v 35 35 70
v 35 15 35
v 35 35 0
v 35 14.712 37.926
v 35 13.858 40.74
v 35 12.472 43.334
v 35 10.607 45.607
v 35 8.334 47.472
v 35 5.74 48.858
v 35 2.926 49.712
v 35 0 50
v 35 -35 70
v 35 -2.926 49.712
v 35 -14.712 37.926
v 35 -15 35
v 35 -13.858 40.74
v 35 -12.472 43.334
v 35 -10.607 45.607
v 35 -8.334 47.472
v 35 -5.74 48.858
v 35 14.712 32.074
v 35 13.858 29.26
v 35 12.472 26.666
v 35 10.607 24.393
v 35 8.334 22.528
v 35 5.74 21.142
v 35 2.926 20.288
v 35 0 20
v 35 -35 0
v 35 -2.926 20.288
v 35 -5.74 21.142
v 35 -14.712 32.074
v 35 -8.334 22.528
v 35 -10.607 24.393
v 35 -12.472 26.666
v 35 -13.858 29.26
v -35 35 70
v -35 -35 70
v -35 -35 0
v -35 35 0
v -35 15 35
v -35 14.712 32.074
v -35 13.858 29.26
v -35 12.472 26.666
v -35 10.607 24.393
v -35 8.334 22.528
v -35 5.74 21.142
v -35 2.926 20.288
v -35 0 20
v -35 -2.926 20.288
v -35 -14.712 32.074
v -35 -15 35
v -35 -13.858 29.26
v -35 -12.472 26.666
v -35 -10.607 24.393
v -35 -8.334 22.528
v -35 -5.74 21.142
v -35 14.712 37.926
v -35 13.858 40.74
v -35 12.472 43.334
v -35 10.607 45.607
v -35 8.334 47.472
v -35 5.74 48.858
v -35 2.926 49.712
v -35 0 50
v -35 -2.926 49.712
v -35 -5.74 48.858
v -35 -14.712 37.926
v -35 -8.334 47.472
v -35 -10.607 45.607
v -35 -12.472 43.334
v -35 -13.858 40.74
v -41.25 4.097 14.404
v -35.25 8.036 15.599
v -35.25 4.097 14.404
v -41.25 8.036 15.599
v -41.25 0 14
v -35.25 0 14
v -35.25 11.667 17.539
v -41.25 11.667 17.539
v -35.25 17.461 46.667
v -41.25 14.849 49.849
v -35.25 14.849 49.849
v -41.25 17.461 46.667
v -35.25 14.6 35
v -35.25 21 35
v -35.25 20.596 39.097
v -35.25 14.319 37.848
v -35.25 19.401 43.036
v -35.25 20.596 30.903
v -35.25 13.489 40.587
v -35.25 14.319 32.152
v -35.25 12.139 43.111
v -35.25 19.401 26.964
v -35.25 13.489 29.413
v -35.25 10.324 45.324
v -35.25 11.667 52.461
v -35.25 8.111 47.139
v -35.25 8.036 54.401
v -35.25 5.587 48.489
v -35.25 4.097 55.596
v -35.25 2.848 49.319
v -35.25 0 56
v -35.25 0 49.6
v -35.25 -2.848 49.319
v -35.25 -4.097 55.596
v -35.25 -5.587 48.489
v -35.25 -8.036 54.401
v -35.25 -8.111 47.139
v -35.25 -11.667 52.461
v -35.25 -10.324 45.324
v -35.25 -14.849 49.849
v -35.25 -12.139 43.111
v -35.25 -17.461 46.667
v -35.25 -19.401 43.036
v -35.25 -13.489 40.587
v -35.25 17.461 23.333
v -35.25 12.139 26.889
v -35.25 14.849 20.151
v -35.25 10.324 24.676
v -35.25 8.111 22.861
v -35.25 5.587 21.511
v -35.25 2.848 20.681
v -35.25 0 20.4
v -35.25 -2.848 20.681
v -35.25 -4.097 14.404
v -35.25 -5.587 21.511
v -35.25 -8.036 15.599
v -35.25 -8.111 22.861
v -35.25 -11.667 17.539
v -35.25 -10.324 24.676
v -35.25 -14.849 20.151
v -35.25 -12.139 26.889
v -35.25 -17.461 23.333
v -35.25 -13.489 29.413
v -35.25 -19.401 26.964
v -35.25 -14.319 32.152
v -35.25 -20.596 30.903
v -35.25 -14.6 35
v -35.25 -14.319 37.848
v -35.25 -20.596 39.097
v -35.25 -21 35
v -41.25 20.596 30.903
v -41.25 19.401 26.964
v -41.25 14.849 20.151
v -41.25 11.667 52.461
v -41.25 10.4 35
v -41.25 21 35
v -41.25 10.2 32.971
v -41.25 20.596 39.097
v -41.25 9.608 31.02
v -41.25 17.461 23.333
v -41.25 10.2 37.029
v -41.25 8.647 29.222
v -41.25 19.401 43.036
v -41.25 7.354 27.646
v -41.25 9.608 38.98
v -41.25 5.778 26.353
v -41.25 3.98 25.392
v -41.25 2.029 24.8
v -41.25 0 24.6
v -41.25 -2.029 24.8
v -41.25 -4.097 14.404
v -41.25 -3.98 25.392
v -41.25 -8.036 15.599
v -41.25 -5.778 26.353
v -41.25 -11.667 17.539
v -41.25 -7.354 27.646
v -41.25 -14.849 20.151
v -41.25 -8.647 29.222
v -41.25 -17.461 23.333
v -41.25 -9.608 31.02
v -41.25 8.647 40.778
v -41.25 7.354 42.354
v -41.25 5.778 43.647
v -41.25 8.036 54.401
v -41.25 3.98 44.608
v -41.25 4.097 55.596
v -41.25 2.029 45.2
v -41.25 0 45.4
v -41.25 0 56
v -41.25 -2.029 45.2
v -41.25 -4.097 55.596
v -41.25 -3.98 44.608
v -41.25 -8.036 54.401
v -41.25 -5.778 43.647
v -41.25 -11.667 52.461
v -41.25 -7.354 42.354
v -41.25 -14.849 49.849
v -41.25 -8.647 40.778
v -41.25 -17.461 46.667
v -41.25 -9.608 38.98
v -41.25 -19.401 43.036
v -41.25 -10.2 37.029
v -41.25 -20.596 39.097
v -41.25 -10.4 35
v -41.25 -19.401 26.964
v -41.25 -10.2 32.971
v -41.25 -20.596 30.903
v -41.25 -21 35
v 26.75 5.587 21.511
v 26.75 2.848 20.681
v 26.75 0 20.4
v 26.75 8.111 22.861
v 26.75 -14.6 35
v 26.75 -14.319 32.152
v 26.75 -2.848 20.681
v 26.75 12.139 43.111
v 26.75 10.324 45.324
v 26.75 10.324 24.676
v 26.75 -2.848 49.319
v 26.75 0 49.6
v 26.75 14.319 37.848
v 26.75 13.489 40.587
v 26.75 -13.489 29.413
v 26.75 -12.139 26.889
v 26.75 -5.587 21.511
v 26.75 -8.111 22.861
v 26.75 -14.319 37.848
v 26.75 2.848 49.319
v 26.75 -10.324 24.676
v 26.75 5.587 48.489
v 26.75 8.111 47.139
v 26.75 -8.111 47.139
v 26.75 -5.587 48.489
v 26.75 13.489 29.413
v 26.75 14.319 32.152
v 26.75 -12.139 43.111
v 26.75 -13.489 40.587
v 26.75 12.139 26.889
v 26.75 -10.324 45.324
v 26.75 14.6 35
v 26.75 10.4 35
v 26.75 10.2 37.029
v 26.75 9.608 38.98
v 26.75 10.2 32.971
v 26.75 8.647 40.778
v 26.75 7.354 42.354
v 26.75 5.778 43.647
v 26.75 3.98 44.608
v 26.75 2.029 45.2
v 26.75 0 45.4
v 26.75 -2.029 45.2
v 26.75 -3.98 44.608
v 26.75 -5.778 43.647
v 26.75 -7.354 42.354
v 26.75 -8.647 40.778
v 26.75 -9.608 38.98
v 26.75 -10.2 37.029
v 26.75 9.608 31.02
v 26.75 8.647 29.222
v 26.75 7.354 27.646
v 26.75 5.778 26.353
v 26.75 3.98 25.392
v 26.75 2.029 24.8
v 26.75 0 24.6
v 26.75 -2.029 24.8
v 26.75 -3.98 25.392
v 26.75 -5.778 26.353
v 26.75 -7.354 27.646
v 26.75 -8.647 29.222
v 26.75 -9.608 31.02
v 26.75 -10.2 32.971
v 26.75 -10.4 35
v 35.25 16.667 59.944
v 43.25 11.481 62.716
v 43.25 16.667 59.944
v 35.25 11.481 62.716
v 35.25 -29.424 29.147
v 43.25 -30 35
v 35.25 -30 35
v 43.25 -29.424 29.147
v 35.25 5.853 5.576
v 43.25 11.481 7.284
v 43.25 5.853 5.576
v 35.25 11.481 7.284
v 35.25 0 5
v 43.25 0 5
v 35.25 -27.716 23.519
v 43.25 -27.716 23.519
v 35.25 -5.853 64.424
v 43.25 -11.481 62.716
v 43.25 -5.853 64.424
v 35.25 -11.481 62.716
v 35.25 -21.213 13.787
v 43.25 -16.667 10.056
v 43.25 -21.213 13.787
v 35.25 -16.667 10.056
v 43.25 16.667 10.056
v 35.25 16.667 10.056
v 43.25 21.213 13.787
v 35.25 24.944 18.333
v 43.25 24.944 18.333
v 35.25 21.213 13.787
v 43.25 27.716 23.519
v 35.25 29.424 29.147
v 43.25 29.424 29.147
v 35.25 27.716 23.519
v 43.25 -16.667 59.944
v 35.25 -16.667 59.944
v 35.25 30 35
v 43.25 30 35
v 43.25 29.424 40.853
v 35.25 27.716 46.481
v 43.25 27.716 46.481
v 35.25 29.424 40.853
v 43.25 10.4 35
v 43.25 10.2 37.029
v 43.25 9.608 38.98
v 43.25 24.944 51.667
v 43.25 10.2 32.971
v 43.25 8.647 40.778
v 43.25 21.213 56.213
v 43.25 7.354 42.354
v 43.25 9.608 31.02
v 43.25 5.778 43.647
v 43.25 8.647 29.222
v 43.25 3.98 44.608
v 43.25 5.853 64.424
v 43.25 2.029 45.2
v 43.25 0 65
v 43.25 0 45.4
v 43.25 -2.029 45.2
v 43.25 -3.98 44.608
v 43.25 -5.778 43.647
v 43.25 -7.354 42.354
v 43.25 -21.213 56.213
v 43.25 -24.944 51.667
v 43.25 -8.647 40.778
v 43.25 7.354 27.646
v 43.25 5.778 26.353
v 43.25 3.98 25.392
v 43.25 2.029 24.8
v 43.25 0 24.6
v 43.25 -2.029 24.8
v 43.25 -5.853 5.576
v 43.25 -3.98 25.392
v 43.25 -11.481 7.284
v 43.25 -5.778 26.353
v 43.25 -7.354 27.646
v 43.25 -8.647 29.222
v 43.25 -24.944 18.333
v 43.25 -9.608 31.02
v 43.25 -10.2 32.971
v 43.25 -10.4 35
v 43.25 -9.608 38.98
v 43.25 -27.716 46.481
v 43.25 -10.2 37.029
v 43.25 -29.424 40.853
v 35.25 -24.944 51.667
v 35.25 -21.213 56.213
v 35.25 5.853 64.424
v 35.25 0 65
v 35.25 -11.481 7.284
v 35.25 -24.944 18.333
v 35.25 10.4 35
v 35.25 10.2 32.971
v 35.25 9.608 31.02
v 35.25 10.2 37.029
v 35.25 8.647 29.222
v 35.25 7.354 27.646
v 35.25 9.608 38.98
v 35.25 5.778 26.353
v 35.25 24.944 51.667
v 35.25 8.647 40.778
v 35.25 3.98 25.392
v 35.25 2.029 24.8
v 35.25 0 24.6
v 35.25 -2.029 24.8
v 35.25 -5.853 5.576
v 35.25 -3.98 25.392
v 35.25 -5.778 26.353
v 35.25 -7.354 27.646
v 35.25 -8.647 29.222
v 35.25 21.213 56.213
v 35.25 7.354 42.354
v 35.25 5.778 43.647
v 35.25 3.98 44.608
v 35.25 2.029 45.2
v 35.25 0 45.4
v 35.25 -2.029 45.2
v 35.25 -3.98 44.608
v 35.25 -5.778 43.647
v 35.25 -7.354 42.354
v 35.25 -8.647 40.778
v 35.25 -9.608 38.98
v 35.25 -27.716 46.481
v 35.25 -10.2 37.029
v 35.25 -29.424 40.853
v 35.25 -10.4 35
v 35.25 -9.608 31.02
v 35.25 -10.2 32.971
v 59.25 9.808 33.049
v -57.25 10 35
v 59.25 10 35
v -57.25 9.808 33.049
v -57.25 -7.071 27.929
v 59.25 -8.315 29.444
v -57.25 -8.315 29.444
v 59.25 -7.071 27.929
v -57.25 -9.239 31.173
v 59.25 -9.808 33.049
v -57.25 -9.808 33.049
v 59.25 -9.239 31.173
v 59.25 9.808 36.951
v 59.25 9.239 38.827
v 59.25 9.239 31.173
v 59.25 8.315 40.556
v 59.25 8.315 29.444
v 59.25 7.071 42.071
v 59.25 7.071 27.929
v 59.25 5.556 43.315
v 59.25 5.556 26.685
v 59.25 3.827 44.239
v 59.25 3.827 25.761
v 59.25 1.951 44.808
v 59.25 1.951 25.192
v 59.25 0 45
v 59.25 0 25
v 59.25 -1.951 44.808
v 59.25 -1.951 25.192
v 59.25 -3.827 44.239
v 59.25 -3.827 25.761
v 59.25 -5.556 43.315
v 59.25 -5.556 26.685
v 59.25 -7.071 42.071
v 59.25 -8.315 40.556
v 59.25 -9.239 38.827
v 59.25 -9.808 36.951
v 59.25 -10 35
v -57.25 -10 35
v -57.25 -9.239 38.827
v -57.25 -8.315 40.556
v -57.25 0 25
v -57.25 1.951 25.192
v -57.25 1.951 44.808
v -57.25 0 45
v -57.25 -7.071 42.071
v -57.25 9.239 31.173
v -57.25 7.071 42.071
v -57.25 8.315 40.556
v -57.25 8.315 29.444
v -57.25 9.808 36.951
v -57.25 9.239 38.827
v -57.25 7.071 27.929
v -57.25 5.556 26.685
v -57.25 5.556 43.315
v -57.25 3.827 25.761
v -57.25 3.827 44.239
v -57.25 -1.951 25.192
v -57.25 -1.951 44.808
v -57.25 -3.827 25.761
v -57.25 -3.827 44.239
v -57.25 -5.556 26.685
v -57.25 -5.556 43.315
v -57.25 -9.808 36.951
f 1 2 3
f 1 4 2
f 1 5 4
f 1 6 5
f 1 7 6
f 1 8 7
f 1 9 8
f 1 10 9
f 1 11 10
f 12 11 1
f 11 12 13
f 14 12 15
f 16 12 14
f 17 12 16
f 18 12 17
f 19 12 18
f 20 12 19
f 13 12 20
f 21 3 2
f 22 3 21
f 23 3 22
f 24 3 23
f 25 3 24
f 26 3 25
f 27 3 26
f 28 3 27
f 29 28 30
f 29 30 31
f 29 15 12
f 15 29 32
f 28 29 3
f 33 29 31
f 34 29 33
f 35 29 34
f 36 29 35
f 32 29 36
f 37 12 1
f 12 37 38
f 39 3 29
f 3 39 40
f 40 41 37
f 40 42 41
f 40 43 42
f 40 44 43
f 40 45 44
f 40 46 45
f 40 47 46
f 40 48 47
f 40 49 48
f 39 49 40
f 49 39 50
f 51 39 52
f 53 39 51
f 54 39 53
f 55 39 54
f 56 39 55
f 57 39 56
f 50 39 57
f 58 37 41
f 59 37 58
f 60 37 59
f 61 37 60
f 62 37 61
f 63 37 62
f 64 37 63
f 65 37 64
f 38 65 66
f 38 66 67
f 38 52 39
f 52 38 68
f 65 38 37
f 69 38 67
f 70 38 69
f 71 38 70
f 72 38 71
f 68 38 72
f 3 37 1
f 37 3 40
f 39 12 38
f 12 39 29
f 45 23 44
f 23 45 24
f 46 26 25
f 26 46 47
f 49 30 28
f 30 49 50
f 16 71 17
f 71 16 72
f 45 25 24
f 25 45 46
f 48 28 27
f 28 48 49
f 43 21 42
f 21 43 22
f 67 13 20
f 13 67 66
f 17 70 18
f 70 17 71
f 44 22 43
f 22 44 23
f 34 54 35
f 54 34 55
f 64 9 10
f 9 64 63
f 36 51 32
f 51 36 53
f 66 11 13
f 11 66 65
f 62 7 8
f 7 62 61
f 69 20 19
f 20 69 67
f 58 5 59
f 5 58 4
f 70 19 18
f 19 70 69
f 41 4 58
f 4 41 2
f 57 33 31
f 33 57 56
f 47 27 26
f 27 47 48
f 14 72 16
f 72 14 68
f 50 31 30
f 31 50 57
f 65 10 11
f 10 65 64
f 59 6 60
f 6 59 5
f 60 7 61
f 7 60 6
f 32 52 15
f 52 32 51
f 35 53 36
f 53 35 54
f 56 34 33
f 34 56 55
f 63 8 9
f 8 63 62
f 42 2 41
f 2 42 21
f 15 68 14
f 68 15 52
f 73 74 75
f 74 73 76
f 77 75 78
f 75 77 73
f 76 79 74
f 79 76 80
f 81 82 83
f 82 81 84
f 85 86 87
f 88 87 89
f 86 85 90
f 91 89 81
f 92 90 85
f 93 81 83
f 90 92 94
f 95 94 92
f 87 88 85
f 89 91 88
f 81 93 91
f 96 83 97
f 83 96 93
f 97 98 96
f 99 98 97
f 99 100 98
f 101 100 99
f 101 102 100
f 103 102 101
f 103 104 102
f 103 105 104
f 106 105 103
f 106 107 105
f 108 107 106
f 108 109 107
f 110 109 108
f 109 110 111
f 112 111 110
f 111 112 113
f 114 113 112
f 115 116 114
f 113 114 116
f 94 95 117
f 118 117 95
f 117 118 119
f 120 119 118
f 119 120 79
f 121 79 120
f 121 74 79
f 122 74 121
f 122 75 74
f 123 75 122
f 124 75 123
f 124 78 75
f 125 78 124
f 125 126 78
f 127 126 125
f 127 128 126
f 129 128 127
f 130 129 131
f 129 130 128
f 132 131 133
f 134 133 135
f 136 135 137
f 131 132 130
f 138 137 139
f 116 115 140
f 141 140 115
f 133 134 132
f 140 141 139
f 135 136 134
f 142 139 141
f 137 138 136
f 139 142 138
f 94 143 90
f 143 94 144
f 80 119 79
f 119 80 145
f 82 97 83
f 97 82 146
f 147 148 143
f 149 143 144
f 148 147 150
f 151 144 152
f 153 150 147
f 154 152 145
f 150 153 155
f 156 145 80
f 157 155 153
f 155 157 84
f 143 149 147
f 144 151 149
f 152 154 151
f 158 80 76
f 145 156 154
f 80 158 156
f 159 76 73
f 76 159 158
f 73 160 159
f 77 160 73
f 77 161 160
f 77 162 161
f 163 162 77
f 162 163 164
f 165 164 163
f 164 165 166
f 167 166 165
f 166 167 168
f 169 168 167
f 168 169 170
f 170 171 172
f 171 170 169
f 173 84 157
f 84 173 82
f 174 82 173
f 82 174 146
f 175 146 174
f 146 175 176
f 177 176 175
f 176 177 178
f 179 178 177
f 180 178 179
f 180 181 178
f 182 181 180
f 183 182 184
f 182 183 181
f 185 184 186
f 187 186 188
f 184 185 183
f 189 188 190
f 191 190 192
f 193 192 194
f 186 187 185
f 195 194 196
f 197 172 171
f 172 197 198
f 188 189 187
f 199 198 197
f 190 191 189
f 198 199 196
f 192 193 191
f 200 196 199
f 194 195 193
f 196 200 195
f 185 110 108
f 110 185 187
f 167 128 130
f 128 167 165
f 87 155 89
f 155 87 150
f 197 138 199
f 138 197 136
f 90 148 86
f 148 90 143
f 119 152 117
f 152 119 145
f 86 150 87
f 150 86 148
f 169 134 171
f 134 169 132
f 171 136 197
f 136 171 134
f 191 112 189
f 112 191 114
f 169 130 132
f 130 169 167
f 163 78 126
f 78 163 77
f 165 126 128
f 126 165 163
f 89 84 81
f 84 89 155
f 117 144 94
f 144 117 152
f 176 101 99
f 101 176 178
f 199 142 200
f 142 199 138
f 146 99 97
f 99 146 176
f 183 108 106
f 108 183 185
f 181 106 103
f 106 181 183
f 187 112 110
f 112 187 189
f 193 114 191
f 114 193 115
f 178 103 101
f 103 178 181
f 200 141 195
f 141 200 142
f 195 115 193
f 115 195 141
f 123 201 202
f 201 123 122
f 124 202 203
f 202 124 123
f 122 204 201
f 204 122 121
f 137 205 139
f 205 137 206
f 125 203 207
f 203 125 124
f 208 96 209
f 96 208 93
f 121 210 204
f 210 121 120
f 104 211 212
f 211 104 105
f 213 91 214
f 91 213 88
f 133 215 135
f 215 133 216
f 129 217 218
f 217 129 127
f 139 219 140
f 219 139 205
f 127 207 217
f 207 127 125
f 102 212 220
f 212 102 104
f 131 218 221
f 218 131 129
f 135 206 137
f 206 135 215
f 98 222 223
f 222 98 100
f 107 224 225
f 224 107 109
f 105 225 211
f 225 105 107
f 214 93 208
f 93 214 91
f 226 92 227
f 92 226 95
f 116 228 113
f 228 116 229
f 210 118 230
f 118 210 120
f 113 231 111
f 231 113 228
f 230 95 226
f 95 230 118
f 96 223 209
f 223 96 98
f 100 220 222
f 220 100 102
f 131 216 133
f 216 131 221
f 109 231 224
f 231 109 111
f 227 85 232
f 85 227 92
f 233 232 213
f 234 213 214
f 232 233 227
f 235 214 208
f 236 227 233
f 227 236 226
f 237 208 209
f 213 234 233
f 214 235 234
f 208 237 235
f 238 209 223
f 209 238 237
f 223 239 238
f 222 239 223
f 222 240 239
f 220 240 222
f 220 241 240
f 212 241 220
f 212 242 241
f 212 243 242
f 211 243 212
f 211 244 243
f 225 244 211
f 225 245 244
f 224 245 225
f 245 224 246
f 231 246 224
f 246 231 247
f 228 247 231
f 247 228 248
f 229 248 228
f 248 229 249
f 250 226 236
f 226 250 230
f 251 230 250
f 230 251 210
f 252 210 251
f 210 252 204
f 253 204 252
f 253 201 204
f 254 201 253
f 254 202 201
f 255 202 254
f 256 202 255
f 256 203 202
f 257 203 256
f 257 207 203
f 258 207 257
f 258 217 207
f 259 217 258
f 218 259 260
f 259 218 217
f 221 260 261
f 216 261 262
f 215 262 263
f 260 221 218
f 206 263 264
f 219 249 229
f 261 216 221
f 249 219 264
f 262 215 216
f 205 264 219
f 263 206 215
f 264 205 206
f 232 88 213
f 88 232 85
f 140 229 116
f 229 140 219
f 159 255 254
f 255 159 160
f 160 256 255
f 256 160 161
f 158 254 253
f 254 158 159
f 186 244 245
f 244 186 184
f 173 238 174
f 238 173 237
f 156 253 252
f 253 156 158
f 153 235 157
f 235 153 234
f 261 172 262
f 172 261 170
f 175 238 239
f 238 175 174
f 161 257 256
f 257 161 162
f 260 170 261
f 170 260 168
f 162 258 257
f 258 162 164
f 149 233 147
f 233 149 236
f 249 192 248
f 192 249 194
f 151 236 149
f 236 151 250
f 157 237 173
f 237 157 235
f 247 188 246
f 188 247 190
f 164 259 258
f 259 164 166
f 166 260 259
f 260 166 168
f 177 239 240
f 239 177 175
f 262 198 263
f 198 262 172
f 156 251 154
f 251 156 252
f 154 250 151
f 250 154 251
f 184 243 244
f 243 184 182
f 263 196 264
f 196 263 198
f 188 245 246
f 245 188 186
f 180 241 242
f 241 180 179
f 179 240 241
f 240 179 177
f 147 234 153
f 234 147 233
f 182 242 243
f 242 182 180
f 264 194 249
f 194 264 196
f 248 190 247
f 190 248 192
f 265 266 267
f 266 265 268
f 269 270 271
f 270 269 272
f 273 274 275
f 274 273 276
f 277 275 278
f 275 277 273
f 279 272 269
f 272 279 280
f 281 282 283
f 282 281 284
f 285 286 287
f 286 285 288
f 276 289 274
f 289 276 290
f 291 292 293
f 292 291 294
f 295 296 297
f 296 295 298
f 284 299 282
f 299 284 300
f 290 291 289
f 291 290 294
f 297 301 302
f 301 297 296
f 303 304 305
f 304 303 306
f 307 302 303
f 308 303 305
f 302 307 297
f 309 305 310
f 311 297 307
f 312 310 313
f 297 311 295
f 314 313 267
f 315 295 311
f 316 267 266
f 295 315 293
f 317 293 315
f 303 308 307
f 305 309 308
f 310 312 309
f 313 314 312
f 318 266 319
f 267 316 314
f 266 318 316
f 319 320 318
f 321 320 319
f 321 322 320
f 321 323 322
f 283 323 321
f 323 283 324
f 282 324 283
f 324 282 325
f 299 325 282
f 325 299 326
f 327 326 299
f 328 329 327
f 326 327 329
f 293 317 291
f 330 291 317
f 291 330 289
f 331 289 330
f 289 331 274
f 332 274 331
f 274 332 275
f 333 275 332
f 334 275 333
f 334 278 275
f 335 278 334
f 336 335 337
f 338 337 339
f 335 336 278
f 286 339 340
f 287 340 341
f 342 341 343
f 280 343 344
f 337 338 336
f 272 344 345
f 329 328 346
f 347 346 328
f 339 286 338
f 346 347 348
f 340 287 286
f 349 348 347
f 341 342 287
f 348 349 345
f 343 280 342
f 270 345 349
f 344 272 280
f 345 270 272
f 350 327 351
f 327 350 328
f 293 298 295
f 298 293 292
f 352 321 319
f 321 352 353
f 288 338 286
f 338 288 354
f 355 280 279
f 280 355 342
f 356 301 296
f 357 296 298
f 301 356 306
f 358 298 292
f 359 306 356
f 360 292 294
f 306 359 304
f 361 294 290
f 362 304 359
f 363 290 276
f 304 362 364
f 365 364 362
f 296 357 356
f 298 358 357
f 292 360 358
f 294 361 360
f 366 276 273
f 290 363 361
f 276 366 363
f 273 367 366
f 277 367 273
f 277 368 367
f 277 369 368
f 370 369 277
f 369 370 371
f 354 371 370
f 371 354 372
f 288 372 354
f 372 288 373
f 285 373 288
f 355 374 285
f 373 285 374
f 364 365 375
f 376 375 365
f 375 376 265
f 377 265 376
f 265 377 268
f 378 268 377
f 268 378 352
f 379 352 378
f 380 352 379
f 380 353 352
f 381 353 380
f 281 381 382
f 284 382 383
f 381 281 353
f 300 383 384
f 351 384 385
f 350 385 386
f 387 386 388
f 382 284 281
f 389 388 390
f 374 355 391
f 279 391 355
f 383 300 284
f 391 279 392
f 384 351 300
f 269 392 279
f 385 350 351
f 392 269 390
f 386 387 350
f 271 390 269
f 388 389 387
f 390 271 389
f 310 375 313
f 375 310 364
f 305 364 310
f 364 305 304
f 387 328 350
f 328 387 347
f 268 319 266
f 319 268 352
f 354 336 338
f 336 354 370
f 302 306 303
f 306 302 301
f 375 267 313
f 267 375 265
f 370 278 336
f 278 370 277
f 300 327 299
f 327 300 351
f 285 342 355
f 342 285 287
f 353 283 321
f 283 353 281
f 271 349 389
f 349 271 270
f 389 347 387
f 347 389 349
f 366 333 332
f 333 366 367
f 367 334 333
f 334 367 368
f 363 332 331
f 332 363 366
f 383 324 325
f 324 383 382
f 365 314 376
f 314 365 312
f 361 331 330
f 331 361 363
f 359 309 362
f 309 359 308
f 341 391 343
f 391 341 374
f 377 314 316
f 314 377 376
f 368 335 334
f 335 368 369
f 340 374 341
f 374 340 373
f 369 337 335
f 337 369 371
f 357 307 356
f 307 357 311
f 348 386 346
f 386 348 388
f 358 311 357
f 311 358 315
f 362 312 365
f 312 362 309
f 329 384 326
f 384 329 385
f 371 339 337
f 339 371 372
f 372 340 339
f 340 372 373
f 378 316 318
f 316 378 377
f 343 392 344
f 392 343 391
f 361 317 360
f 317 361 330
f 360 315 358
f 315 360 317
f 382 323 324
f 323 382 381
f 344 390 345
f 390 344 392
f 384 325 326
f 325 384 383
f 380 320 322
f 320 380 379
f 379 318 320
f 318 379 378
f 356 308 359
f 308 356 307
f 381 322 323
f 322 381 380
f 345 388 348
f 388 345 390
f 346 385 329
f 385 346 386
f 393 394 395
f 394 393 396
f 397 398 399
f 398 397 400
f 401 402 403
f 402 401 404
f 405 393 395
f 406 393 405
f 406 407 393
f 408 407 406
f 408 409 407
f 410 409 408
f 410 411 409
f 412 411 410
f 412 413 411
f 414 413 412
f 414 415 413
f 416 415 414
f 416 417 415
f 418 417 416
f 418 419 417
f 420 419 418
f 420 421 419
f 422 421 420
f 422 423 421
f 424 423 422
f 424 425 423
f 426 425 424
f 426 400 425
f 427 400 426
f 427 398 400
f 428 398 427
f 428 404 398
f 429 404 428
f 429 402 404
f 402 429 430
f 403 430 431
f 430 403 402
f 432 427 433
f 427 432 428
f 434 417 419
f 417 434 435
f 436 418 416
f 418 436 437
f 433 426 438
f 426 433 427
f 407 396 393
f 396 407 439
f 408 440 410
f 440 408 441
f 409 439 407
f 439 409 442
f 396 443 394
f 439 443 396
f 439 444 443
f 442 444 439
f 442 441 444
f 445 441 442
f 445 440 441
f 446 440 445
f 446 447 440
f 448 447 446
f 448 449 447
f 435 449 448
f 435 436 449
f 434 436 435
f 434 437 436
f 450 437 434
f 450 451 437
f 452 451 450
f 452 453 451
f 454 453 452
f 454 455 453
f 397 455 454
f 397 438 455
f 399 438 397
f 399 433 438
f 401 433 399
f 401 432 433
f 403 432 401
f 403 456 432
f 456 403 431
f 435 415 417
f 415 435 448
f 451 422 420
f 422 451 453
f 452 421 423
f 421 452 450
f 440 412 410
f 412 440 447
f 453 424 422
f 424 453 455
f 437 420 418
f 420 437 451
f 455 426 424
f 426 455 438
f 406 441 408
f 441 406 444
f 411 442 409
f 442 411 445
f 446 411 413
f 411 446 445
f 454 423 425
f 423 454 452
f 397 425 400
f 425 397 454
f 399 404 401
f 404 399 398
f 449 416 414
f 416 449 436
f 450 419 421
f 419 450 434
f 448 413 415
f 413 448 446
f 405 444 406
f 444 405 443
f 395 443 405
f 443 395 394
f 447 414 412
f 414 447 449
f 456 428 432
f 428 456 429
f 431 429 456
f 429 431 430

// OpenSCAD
$fn = 32;

// ------------------------------------------------------------------------
// Bushed housing: 70 x 70 x 70 mm housing, bushing d29.2
// Every part is its own module, assembly() places them once.
// ------------------------------------------------------------------------

// --- part 1 ---
module housing() {
  difference() {
    translate([-35, -35, 0]) cube([70, 70, 70]);
    translate([0, 0, 35]) rotate([0, 90, 0]) cylinder(h = 72, d = 30, center = true);
  }
}

// --- part 2 ---
module bushing() {
  difference() {
    union() {
      cylinder(h = 6, d = 42);
      translate([0, 0, 6]) cylinder(h = 62, d = 29.2);
    }
    translate([0, 0, -1]) cylinder(h = 70, d = 20.8);
  }
}

// --- part 3 ---
module shaft() {
  translate([0, 0, -58.25]) cylinder(h = 116.5, d = 20);
}

// --- part 4 ---
module cover() {
  difference() {
    cylinder(h = 8, d = 60);
    translate([0, 0, -1]) cylinder(h = 10, d = 20.8);
  }
}

// --- assembly ---
module assembly() {
  translate([0, 0, 0]) rotate([0, 0, 0]) housing();
  translate([-41.25, 0, 35]) rotate([0, 90, 0]) bushing();
  translate([1, 0, 35]) rotate([0, 90, 0]) shaft();
  translate([35.25, 0, 35]) rotate([0, 90, 0]) cover();
}

assembly();
